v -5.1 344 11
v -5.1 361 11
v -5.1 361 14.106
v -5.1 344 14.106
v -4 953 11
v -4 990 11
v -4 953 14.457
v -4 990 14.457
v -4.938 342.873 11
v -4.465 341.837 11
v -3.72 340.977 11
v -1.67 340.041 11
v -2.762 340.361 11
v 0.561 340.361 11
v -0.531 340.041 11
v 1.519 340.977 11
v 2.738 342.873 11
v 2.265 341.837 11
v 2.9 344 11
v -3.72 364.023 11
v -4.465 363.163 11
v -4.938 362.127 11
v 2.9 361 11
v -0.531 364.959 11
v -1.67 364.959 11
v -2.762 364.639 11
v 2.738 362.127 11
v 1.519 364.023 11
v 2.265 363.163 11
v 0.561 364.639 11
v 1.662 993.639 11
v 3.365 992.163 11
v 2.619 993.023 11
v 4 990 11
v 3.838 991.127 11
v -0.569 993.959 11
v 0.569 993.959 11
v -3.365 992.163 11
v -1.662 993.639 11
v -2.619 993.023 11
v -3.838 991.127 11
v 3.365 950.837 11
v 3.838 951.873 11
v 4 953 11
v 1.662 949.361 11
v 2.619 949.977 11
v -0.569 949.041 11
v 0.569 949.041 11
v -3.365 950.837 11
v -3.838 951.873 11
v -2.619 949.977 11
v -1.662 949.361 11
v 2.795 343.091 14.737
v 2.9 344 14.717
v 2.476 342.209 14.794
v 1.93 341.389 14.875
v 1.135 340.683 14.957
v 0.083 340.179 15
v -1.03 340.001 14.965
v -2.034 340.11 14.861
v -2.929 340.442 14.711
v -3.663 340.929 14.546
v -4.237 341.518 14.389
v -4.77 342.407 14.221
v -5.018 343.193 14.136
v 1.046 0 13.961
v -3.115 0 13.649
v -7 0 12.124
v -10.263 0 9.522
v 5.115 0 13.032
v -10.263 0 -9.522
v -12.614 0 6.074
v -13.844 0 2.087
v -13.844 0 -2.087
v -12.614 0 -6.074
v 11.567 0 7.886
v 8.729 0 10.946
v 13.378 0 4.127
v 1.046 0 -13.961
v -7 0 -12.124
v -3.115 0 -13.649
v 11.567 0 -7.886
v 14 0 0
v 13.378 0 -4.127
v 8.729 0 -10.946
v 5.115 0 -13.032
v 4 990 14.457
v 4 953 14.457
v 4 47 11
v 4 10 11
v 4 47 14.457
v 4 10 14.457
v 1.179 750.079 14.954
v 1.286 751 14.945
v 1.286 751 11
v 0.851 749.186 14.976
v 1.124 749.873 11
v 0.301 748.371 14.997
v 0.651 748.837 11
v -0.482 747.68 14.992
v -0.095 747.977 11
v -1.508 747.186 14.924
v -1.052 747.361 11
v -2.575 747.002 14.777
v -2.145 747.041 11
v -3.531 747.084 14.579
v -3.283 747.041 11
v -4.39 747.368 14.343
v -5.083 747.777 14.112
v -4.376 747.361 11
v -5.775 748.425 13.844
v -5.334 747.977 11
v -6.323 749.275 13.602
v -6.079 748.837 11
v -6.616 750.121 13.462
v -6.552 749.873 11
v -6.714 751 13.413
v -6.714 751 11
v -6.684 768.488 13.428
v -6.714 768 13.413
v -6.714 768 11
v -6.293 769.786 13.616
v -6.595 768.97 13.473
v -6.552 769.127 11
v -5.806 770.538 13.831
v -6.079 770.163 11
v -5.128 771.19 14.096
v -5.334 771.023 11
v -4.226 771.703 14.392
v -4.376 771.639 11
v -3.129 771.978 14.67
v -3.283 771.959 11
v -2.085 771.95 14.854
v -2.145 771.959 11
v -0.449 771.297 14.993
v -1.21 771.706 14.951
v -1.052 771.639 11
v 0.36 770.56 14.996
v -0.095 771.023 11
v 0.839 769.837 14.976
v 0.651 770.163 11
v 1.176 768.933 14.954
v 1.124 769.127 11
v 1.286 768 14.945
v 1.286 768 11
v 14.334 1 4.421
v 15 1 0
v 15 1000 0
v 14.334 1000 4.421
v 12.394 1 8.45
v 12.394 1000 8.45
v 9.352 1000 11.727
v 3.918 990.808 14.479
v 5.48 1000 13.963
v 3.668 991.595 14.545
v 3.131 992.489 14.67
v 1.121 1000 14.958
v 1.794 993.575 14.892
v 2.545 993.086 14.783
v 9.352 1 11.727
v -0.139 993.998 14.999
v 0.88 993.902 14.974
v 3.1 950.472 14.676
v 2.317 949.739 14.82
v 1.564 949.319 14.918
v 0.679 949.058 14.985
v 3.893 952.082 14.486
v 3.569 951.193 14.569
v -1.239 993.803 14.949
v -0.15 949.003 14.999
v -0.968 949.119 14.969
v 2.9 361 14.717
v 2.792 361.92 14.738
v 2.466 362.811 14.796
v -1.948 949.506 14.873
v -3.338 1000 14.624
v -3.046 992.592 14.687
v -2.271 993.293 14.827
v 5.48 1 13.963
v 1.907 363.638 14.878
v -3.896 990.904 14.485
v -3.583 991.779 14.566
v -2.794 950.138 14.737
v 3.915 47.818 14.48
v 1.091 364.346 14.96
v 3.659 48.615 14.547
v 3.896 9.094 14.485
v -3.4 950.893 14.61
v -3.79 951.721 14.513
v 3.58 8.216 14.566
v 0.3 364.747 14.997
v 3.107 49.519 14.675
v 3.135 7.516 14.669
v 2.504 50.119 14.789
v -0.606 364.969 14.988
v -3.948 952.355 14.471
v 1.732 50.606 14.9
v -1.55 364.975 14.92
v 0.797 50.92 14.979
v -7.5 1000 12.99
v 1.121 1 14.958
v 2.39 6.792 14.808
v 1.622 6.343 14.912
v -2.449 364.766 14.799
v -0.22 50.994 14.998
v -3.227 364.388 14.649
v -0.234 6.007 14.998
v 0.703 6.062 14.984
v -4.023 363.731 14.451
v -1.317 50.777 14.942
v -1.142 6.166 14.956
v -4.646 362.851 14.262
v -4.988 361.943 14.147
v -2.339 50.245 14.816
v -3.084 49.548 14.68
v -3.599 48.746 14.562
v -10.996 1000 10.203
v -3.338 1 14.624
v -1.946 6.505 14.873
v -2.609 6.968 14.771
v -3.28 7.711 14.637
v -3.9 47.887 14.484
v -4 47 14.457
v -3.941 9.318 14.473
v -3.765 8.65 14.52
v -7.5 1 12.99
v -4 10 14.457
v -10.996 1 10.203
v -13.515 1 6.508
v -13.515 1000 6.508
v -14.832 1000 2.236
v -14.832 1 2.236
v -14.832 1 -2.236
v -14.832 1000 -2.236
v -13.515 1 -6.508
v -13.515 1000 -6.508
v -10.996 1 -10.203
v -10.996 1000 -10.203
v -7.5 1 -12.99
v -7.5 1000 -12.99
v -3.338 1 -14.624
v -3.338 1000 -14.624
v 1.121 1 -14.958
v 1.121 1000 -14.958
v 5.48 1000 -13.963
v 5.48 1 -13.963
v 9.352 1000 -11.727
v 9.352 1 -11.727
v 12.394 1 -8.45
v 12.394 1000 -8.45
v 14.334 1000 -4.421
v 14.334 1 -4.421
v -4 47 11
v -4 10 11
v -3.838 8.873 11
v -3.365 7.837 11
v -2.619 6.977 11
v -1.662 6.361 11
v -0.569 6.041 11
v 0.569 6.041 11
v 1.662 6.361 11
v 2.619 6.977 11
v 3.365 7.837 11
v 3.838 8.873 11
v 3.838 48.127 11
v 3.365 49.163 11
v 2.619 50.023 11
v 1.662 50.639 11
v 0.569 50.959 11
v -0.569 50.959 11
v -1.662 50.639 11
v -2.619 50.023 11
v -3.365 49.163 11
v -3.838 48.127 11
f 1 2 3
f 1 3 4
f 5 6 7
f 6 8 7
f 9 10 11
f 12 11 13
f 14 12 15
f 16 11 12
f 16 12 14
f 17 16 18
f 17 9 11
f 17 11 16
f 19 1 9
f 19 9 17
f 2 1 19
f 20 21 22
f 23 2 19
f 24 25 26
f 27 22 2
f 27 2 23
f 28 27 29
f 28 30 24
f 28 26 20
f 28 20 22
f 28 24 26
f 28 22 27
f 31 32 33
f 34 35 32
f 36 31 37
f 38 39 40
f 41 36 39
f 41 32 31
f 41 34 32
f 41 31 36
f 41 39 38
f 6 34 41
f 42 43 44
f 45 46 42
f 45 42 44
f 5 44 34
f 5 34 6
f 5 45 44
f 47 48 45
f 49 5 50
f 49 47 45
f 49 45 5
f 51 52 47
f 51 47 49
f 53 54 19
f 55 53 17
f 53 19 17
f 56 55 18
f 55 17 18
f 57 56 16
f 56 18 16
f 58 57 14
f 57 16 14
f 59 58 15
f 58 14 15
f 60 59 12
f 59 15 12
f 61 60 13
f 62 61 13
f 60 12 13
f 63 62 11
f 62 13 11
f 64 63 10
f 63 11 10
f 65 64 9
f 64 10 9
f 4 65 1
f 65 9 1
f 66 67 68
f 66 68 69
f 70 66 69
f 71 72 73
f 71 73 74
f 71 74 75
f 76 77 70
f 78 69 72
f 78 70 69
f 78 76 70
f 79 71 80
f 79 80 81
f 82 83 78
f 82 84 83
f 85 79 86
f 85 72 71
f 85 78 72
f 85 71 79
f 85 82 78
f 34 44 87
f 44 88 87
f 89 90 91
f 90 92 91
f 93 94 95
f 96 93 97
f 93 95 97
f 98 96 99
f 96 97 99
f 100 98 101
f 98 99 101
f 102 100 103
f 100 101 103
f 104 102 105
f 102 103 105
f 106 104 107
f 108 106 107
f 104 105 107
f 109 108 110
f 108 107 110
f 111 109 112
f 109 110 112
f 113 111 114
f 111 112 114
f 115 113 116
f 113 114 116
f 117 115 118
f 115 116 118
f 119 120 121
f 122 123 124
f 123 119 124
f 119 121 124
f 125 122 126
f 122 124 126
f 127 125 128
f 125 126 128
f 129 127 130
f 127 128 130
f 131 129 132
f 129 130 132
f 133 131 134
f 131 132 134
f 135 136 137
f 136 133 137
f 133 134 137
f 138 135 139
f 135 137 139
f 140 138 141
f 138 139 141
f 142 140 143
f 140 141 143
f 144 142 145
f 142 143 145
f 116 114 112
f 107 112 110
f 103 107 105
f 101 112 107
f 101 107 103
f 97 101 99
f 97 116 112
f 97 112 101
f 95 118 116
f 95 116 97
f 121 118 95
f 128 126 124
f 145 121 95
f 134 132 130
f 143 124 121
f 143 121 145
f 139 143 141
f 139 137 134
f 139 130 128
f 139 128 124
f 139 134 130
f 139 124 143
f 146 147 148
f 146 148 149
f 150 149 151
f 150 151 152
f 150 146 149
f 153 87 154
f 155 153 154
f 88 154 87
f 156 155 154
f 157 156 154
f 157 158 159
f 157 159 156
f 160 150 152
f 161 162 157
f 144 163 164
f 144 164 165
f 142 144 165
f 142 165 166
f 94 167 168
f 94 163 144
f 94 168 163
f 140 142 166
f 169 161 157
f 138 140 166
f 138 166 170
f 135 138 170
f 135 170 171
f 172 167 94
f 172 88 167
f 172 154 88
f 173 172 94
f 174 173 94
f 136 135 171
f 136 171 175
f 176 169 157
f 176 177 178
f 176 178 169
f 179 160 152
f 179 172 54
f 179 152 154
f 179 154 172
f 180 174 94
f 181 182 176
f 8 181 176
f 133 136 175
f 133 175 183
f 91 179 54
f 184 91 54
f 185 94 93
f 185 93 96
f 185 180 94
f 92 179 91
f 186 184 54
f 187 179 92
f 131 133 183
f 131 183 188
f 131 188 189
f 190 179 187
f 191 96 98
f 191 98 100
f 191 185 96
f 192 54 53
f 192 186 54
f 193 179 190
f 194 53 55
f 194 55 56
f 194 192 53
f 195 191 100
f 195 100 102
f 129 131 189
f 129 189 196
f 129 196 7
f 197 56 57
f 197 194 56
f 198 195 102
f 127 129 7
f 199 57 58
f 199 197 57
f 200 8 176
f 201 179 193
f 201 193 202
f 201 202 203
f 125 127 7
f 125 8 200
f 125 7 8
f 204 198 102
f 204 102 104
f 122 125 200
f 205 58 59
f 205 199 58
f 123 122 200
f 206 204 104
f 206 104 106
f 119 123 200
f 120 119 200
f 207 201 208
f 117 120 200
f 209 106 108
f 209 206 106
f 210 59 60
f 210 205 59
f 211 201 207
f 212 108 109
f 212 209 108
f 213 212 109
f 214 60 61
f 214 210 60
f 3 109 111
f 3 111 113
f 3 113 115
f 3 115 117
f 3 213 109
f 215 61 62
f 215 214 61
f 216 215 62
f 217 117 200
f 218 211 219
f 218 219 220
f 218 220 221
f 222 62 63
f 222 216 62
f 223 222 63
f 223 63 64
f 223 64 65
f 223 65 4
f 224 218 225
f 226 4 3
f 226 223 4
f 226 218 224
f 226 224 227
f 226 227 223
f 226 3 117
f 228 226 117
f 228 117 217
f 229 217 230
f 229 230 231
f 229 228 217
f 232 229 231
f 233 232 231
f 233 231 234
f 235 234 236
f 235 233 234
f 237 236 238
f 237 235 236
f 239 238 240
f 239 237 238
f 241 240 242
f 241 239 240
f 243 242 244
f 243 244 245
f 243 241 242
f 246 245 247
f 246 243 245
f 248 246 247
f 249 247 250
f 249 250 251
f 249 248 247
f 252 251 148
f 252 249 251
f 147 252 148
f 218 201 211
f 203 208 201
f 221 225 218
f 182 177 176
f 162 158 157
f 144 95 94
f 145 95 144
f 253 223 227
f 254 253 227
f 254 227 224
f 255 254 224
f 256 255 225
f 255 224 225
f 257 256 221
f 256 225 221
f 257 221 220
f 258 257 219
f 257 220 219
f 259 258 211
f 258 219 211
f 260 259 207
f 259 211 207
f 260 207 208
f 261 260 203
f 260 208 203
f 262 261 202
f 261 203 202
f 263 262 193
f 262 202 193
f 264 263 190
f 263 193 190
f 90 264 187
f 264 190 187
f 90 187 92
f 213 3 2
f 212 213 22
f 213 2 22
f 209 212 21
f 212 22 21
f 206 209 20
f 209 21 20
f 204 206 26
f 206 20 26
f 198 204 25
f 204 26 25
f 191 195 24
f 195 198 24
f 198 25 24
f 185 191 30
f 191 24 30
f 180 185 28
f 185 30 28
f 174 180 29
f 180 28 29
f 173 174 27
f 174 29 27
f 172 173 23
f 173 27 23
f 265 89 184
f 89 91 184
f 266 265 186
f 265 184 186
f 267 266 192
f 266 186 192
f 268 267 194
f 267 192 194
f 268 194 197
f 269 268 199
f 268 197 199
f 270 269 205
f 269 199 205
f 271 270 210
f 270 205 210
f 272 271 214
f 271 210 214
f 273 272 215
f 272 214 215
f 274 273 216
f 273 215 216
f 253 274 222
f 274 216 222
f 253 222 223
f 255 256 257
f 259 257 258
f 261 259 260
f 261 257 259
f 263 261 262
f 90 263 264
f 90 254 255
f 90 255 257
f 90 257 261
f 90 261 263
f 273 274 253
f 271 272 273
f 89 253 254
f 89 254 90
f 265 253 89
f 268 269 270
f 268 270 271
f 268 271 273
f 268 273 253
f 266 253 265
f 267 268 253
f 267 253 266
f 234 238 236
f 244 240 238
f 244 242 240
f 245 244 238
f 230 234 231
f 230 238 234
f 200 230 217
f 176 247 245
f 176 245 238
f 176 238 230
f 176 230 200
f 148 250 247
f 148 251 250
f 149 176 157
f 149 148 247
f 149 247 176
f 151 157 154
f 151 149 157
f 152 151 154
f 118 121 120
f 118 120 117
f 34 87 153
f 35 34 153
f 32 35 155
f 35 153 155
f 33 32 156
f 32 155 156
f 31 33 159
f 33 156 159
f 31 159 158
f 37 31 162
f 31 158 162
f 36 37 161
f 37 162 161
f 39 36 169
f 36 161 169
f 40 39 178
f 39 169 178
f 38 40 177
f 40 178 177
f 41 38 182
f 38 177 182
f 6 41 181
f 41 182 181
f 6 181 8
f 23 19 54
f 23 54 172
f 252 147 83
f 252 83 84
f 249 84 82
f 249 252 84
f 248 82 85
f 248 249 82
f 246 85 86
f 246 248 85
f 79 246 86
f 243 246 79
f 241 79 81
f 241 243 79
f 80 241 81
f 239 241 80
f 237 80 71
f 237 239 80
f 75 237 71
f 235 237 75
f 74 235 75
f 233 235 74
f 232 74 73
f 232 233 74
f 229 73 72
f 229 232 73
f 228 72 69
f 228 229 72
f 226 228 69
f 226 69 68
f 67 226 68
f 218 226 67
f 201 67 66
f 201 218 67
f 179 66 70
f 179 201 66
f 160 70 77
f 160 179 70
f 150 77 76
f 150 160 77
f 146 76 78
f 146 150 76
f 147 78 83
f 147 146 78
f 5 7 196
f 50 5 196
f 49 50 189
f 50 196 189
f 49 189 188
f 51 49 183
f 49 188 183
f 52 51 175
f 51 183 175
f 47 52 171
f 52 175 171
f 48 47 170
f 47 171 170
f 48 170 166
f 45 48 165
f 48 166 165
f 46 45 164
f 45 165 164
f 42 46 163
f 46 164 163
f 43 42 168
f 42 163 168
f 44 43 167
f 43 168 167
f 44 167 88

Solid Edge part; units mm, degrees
sketch "Sketch1" plane through (10.8674, 0, 10.8674) normal (0, -1, 0) x (1, 0, 0)
  circle A0 centre (-10.8674, -10.8674) radius 15
extrude "Protrusion1" add sketch "Sketch1" against normal blind 500
chamfer "Chamfer" distance 1 angle 45 1 edges at (-15, 0, 0)
sketch "Sketch2" plane through (0, 250.5, 15) normal (0, 0, 1) x (0, -1, 0)
  line L0 (203.5, -4) -> (240.5, -4)
  arc A0 (240.5, 4) -> (240.5, -4) centre (240.5, 0) cw
  line L1 (240.5, 4) -> (203.5, 4)
  arc A1 (203.5, 4) -> (203.5, -4) centre (203.5, 0) ccw
  dimension "D1" = 8
  dimension "D2" = 10
extrude "KeySlot_Wheel_Hub" cut sketch "Sketch2" against normal blind 4
mirror "Mirror1" about plane through (0, 500, 0) normal (0, 1, 0) of "Protrusion1", "KeySlot_Wheel_Hub"
sketch "Sketch3" plane through (-2.7141, 250.8352, 11) normal (0, 0, 1) x (0, -1, 0)
  line L0 (-517.1648, -4) -> (-500.1648, -4)
  arc A0 (-500.1648, 4) -> (-500.1648, -4) centre (-500.1648, 0) cw
  line L1 (-500.1648, 4) -> (-517.1648, 4)
  arc A1 (-517.1648, 4) -> (-517.1648, -4) centre (-517.1648, 0) ccw
  dimension "D1" = 228
extrude "Cutout2" cut sketch "Sketch3" along normal blind 61.758
sketch "Sketch4" plane through (-1.1004, 261.9084, 11) normal (0, 0, 1) x (0, -1, 0)
  line L0 (-99.0916, -4) -> (-82.0916, -4)
  arc A0 (-82.0916, 4) -> (-82.0916, -4) centre (-82.0916, 0) cw
  line L1 (-82.0916, 4) -> (-99.0916, 4)
  arc A1 (-99.0916, 4) -> (-99.0916, -4) centre (-99.0916, 0) ccw
  dimension "D1" = 635
extrude "KeySlot_Chain_Sprocket_Hub" cut sketch "Sketch4" along normal blind 21.355
properties material "Steel"
